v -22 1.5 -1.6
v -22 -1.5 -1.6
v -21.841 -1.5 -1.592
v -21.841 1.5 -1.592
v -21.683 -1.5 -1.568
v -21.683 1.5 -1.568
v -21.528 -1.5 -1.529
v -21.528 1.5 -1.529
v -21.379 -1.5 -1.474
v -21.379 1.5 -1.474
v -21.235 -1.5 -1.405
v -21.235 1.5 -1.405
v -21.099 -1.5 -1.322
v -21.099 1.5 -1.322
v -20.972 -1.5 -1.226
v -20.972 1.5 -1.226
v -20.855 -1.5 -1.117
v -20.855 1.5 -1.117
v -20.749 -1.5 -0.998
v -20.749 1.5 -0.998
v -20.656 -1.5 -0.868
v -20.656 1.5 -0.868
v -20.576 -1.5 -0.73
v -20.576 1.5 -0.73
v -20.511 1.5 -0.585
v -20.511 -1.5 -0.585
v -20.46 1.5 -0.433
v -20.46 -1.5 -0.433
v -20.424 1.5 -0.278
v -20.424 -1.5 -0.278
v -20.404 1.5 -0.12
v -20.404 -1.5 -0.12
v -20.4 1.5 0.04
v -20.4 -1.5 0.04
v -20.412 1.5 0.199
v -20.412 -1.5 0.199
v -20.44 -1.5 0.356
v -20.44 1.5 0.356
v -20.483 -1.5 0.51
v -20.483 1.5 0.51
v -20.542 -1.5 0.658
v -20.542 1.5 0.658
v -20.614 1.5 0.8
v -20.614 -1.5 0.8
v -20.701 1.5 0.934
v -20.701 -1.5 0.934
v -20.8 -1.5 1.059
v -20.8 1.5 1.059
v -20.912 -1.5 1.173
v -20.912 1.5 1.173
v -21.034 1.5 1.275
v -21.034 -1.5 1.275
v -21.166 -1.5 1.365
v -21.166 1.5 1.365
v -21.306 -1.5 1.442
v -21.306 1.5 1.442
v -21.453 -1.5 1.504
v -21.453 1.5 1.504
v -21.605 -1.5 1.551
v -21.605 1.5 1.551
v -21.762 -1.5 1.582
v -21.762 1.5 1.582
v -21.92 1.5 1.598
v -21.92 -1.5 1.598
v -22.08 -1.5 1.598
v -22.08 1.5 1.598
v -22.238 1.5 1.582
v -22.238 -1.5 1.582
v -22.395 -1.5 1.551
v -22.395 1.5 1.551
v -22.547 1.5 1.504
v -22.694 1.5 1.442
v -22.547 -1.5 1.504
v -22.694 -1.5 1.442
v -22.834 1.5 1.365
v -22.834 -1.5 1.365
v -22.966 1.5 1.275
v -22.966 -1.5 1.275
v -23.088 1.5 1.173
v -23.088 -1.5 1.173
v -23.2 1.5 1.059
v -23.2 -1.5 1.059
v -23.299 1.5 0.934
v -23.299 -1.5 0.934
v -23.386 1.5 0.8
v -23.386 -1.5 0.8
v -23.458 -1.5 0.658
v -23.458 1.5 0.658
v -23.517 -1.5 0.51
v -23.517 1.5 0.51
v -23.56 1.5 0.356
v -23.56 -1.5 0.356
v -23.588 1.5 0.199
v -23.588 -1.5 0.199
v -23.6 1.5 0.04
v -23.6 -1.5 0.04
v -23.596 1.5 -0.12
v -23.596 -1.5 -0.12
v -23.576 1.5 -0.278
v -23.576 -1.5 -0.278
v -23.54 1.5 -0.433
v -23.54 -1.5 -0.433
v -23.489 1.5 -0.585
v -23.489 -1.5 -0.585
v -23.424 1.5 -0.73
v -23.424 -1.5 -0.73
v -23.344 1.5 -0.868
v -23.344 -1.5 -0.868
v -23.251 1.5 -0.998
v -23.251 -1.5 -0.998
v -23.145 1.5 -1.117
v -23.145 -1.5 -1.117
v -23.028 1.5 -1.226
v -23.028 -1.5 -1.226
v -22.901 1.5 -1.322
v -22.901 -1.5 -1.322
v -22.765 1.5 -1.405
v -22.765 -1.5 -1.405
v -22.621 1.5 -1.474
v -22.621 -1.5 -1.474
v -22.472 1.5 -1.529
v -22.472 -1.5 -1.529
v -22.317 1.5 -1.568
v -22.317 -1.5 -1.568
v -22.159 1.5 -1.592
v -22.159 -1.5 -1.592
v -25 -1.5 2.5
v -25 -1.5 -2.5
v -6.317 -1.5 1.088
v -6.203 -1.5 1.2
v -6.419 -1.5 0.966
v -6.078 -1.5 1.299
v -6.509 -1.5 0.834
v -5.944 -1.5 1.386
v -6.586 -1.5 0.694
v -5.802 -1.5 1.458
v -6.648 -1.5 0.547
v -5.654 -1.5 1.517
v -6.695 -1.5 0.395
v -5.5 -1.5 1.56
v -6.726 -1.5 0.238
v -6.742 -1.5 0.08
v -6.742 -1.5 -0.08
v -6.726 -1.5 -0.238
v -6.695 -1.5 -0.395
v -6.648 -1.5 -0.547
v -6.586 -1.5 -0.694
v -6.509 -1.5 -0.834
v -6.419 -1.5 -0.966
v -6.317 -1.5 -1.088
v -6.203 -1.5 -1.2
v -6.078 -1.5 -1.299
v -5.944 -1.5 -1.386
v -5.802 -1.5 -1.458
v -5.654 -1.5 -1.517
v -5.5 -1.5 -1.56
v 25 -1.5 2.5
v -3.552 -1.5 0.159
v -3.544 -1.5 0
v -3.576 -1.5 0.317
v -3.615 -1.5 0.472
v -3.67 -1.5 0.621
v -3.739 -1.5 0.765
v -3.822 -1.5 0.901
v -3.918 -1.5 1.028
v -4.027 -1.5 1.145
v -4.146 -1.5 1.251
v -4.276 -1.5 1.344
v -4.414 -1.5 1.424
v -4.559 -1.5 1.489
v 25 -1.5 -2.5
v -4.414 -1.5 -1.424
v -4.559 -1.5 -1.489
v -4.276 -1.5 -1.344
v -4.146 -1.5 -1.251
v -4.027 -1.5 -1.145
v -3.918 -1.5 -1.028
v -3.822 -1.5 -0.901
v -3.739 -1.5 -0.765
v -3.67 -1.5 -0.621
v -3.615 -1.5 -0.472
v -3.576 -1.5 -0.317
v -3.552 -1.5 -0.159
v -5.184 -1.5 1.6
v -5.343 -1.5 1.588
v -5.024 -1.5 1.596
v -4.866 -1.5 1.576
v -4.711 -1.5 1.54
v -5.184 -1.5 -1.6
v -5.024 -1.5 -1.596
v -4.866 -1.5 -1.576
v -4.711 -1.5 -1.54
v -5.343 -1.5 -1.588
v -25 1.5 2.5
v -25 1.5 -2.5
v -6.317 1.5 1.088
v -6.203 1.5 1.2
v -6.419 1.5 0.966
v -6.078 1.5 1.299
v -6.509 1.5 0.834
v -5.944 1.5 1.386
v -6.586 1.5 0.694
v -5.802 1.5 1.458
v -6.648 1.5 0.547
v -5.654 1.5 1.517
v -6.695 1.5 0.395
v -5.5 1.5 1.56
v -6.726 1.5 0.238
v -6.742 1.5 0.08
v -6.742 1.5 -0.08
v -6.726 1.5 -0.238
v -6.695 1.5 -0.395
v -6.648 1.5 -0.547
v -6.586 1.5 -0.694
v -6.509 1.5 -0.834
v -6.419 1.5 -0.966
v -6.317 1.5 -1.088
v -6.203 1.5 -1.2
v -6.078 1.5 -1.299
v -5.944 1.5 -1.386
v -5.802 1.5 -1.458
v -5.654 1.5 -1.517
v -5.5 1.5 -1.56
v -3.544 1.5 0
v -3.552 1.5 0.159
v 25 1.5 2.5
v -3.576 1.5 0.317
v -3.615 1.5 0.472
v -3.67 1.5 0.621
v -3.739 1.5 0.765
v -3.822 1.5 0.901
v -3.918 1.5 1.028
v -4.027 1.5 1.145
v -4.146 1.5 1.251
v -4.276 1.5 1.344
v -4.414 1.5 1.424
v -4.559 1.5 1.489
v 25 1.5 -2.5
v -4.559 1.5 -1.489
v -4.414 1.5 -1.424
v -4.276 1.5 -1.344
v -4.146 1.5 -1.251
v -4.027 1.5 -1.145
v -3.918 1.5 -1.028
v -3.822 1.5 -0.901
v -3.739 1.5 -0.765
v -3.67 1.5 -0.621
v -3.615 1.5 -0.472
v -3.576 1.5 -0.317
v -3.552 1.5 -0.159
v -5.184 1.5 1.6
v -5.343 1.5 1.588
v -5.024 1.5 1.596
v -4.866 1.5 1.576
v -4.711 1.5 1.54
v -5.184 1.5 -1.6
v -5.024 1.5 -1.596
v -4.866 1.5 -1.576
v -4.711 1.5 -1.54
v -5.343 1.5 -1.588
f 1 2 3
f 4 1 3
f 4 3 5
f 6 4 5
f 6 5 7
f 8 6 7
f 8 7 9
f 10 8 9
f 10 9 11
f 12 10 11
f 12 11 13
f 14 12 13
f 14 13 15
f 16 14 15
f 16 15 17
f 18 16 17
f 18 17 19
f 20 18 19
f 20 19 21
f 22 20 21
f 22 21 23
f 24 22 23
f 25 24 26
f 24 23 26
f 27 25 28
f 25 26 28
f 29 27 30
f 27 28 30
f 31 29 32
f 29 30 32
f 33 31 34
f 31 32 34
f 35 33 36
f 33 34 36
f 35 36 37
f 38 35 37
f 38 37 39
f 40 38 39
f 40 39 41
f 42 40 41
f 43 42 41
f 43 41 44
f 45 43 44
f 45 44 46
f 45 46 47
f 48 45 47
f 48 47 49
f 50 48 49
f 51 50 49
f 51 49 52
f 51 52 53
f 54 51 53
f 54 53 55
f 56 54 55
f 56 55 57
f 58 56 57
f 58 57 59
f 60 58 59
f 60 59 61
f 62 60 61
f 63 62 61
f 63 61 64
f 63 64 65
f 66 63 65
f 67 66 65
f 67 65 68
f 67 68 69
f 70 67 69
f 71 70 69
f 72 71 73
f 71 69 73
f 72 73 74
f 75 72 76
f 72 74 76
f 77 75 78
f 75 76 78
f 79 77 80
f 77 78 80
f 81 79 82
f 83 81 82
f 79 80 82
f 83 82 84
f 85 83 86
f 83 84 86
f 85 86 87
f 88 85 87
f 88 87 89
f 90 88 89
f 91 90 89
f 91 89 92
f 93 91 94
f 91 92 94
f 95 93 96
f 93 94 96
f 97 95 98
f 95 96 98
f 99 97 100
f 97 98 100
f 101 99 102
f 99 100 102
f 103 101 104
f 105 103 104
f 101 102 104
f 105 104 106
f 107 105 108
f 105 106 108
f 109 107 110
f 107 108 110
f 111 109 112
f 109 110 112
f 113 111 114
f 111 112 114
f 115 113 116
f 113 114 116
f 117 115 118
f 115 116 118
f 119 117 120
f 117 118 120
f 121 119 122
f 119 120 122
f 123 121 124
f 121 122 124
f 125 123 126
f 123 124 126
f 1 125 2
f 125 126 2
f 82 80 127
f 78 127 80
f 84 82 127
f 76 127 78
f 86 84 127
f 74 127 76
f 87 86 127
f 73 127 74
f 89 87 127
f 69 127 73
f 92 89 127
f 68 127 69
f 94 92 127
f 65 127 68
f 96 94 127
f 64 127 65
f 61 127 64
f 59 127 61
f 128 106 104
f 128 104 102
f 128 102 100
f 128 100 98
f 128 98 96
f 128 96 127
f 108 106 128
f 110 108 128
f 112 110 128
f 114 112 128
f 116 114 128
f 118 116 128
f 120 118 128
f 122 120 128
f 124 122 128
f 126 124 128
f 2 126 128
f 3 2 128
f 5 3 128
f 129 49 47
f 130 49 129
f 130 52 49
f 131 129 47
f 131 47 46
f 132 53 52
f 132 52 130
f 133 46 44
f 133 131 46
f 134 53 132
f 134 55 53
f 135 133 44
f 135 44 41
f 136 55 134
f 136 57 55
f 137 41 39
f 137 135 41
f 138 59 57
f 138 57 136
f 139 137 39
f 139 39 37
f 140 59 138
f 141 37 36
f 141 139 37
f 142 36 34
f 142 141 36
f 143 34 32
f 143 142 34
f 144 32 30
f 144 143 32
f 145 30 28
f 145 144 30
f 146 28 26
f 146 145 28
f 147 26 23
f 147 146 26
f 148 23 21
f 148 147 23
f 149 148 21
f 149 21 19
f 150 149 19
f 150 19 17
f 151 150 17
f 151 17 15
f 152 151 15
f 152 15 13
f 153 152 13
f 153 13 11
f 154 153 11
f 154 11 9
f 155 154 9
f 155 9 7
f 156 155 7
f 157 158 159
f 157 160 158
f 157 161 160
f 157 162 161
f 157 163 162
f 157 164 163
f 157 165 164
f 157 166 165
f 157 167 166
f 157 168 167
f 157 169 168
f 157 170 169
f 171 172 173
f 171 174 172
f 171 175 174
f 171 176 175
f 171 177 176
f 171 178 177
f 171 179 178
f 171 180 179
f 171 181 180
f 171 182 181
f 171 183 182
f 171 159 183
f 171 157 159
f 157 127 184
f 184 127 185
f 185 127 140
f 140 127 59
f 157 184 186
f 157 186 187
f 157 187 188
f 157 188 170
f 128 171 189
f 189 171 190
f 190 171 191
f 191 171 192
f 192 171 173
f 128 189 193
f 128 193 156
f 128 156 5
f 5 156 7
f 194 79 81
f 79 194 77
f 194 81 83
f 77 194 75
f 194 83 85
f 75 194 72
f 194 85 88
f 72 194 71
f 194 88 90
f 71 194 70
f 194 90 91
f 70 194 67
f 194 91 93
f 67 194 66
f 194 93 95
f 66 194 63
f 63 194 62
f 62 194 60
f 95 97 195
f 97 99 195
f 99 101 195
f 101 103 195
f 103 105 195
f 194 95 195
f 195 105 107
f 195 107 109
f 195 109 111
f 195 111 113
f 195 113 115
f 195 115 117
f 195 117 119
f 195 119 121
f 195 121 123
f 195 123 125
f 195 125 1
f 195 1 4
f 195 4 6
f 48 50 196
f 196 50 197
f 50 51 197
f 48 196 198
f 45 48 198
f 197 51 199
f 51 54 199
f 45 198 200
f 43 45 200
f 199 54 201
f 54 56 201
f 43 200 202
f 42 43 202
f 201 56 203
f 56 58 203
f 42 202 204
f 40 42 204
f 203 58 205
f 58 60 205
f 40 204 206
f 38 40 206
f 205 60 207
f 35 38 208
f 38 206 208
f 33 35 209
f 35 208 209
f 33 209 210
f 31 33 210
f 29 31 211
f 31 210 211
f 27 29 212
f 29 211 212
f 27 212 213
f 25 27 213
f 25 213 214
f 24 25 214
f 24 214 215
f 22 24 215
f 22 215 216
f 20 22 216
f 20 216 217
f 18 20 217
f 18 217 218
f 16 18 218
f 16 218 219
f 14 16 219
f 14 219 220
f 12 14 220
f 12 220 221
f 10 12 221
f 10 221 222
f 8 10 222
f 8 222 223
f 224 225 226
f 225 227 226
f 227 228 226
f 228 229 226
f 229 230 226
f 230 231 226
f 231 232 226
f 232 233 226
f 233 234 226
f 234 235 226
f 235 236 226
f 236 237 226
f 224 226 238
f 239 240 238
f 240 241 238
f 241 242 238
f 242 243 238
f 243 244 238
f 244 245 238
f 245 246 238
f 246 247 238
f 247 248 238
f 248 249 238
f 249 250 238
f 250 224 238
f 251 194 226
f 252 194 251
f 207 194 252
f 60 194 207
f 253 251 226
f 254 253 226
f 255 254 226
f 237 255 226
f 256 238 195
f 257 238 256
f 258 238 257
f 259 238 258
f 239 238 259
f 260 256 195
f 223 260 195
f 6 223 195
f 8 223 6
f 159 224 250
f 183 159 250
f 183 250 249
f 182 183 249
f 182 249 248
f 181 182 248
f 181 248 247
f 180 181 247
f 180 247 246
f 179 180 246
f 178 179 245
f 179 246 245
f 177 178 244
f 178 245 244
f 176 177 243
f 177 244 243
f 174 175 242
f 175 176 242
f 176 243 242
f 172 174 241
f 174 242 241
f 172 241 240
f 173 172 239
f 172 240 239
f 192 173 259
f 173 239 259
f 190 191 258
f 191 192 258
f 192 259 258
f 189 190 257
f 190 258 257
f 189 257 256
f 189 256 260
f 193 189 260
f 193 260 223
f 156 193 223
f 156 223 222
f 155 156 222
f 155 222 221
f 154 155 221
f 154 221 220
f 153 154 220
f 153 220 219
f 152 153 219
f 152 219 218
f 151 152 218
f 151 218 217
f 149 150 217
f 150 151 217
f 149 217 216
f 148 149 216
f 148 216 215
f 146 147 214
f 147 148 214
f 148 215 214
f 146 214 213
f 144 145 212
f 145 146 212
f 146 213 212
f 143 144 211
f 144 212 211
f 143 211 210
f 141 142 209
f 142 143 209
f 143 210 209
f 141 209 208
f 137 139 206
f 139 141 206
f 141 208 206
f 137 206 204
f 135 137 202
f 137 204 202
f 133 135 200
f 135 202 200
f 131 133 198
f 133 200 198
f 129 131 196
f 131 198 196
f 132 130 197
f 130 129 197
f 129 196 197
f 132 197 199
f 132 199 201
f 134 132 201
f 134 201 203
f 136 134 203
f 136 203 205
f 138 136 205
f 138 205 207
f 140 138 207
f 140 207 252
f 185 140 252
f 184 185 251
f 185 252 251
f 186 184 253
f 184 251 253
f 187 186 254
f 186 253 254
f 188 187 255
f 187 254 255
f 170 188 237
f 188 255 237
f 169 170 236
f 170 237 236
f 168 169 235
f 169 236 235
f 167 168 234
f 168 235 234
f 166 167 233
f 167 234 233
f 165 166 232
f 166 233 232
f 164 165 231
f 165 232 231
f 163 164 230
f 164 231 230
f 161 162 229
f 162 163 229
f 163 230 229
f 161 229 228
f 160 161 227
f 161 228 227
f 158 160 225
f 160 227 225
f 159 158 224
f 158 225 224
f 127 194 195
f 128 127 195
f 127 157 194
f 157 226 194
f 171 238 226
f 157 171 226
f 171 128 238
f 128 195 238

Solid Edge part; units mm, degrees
sketch "Sketch1" plane through (0, 0, 0) normal (0, -1, 0) x (1, 0, 0)
  line L0 (-25, -2.5) -> (25, -2.5)
  line L1 (25, -2.5) -> (25, 2.5)
  line L2 (25, 2.5) -> (-25, 2.5)
  line L3 (-25, 2.5) -> (-25, -2.5)
  circle A0 centre (-5.144, 0) radius 1.6
  dimension "D1" = 30.144
  dimension "D2" = 50
  dimension "D3" = 5
  dimension "D4" = 25
extrude "Protrusion1" add sketch "Sketch1" along normal mid plane 3
hole "Hole_3" at (-22, -1.5, 0) direction (0, 1, 0) diameter 3.2 end up to next
